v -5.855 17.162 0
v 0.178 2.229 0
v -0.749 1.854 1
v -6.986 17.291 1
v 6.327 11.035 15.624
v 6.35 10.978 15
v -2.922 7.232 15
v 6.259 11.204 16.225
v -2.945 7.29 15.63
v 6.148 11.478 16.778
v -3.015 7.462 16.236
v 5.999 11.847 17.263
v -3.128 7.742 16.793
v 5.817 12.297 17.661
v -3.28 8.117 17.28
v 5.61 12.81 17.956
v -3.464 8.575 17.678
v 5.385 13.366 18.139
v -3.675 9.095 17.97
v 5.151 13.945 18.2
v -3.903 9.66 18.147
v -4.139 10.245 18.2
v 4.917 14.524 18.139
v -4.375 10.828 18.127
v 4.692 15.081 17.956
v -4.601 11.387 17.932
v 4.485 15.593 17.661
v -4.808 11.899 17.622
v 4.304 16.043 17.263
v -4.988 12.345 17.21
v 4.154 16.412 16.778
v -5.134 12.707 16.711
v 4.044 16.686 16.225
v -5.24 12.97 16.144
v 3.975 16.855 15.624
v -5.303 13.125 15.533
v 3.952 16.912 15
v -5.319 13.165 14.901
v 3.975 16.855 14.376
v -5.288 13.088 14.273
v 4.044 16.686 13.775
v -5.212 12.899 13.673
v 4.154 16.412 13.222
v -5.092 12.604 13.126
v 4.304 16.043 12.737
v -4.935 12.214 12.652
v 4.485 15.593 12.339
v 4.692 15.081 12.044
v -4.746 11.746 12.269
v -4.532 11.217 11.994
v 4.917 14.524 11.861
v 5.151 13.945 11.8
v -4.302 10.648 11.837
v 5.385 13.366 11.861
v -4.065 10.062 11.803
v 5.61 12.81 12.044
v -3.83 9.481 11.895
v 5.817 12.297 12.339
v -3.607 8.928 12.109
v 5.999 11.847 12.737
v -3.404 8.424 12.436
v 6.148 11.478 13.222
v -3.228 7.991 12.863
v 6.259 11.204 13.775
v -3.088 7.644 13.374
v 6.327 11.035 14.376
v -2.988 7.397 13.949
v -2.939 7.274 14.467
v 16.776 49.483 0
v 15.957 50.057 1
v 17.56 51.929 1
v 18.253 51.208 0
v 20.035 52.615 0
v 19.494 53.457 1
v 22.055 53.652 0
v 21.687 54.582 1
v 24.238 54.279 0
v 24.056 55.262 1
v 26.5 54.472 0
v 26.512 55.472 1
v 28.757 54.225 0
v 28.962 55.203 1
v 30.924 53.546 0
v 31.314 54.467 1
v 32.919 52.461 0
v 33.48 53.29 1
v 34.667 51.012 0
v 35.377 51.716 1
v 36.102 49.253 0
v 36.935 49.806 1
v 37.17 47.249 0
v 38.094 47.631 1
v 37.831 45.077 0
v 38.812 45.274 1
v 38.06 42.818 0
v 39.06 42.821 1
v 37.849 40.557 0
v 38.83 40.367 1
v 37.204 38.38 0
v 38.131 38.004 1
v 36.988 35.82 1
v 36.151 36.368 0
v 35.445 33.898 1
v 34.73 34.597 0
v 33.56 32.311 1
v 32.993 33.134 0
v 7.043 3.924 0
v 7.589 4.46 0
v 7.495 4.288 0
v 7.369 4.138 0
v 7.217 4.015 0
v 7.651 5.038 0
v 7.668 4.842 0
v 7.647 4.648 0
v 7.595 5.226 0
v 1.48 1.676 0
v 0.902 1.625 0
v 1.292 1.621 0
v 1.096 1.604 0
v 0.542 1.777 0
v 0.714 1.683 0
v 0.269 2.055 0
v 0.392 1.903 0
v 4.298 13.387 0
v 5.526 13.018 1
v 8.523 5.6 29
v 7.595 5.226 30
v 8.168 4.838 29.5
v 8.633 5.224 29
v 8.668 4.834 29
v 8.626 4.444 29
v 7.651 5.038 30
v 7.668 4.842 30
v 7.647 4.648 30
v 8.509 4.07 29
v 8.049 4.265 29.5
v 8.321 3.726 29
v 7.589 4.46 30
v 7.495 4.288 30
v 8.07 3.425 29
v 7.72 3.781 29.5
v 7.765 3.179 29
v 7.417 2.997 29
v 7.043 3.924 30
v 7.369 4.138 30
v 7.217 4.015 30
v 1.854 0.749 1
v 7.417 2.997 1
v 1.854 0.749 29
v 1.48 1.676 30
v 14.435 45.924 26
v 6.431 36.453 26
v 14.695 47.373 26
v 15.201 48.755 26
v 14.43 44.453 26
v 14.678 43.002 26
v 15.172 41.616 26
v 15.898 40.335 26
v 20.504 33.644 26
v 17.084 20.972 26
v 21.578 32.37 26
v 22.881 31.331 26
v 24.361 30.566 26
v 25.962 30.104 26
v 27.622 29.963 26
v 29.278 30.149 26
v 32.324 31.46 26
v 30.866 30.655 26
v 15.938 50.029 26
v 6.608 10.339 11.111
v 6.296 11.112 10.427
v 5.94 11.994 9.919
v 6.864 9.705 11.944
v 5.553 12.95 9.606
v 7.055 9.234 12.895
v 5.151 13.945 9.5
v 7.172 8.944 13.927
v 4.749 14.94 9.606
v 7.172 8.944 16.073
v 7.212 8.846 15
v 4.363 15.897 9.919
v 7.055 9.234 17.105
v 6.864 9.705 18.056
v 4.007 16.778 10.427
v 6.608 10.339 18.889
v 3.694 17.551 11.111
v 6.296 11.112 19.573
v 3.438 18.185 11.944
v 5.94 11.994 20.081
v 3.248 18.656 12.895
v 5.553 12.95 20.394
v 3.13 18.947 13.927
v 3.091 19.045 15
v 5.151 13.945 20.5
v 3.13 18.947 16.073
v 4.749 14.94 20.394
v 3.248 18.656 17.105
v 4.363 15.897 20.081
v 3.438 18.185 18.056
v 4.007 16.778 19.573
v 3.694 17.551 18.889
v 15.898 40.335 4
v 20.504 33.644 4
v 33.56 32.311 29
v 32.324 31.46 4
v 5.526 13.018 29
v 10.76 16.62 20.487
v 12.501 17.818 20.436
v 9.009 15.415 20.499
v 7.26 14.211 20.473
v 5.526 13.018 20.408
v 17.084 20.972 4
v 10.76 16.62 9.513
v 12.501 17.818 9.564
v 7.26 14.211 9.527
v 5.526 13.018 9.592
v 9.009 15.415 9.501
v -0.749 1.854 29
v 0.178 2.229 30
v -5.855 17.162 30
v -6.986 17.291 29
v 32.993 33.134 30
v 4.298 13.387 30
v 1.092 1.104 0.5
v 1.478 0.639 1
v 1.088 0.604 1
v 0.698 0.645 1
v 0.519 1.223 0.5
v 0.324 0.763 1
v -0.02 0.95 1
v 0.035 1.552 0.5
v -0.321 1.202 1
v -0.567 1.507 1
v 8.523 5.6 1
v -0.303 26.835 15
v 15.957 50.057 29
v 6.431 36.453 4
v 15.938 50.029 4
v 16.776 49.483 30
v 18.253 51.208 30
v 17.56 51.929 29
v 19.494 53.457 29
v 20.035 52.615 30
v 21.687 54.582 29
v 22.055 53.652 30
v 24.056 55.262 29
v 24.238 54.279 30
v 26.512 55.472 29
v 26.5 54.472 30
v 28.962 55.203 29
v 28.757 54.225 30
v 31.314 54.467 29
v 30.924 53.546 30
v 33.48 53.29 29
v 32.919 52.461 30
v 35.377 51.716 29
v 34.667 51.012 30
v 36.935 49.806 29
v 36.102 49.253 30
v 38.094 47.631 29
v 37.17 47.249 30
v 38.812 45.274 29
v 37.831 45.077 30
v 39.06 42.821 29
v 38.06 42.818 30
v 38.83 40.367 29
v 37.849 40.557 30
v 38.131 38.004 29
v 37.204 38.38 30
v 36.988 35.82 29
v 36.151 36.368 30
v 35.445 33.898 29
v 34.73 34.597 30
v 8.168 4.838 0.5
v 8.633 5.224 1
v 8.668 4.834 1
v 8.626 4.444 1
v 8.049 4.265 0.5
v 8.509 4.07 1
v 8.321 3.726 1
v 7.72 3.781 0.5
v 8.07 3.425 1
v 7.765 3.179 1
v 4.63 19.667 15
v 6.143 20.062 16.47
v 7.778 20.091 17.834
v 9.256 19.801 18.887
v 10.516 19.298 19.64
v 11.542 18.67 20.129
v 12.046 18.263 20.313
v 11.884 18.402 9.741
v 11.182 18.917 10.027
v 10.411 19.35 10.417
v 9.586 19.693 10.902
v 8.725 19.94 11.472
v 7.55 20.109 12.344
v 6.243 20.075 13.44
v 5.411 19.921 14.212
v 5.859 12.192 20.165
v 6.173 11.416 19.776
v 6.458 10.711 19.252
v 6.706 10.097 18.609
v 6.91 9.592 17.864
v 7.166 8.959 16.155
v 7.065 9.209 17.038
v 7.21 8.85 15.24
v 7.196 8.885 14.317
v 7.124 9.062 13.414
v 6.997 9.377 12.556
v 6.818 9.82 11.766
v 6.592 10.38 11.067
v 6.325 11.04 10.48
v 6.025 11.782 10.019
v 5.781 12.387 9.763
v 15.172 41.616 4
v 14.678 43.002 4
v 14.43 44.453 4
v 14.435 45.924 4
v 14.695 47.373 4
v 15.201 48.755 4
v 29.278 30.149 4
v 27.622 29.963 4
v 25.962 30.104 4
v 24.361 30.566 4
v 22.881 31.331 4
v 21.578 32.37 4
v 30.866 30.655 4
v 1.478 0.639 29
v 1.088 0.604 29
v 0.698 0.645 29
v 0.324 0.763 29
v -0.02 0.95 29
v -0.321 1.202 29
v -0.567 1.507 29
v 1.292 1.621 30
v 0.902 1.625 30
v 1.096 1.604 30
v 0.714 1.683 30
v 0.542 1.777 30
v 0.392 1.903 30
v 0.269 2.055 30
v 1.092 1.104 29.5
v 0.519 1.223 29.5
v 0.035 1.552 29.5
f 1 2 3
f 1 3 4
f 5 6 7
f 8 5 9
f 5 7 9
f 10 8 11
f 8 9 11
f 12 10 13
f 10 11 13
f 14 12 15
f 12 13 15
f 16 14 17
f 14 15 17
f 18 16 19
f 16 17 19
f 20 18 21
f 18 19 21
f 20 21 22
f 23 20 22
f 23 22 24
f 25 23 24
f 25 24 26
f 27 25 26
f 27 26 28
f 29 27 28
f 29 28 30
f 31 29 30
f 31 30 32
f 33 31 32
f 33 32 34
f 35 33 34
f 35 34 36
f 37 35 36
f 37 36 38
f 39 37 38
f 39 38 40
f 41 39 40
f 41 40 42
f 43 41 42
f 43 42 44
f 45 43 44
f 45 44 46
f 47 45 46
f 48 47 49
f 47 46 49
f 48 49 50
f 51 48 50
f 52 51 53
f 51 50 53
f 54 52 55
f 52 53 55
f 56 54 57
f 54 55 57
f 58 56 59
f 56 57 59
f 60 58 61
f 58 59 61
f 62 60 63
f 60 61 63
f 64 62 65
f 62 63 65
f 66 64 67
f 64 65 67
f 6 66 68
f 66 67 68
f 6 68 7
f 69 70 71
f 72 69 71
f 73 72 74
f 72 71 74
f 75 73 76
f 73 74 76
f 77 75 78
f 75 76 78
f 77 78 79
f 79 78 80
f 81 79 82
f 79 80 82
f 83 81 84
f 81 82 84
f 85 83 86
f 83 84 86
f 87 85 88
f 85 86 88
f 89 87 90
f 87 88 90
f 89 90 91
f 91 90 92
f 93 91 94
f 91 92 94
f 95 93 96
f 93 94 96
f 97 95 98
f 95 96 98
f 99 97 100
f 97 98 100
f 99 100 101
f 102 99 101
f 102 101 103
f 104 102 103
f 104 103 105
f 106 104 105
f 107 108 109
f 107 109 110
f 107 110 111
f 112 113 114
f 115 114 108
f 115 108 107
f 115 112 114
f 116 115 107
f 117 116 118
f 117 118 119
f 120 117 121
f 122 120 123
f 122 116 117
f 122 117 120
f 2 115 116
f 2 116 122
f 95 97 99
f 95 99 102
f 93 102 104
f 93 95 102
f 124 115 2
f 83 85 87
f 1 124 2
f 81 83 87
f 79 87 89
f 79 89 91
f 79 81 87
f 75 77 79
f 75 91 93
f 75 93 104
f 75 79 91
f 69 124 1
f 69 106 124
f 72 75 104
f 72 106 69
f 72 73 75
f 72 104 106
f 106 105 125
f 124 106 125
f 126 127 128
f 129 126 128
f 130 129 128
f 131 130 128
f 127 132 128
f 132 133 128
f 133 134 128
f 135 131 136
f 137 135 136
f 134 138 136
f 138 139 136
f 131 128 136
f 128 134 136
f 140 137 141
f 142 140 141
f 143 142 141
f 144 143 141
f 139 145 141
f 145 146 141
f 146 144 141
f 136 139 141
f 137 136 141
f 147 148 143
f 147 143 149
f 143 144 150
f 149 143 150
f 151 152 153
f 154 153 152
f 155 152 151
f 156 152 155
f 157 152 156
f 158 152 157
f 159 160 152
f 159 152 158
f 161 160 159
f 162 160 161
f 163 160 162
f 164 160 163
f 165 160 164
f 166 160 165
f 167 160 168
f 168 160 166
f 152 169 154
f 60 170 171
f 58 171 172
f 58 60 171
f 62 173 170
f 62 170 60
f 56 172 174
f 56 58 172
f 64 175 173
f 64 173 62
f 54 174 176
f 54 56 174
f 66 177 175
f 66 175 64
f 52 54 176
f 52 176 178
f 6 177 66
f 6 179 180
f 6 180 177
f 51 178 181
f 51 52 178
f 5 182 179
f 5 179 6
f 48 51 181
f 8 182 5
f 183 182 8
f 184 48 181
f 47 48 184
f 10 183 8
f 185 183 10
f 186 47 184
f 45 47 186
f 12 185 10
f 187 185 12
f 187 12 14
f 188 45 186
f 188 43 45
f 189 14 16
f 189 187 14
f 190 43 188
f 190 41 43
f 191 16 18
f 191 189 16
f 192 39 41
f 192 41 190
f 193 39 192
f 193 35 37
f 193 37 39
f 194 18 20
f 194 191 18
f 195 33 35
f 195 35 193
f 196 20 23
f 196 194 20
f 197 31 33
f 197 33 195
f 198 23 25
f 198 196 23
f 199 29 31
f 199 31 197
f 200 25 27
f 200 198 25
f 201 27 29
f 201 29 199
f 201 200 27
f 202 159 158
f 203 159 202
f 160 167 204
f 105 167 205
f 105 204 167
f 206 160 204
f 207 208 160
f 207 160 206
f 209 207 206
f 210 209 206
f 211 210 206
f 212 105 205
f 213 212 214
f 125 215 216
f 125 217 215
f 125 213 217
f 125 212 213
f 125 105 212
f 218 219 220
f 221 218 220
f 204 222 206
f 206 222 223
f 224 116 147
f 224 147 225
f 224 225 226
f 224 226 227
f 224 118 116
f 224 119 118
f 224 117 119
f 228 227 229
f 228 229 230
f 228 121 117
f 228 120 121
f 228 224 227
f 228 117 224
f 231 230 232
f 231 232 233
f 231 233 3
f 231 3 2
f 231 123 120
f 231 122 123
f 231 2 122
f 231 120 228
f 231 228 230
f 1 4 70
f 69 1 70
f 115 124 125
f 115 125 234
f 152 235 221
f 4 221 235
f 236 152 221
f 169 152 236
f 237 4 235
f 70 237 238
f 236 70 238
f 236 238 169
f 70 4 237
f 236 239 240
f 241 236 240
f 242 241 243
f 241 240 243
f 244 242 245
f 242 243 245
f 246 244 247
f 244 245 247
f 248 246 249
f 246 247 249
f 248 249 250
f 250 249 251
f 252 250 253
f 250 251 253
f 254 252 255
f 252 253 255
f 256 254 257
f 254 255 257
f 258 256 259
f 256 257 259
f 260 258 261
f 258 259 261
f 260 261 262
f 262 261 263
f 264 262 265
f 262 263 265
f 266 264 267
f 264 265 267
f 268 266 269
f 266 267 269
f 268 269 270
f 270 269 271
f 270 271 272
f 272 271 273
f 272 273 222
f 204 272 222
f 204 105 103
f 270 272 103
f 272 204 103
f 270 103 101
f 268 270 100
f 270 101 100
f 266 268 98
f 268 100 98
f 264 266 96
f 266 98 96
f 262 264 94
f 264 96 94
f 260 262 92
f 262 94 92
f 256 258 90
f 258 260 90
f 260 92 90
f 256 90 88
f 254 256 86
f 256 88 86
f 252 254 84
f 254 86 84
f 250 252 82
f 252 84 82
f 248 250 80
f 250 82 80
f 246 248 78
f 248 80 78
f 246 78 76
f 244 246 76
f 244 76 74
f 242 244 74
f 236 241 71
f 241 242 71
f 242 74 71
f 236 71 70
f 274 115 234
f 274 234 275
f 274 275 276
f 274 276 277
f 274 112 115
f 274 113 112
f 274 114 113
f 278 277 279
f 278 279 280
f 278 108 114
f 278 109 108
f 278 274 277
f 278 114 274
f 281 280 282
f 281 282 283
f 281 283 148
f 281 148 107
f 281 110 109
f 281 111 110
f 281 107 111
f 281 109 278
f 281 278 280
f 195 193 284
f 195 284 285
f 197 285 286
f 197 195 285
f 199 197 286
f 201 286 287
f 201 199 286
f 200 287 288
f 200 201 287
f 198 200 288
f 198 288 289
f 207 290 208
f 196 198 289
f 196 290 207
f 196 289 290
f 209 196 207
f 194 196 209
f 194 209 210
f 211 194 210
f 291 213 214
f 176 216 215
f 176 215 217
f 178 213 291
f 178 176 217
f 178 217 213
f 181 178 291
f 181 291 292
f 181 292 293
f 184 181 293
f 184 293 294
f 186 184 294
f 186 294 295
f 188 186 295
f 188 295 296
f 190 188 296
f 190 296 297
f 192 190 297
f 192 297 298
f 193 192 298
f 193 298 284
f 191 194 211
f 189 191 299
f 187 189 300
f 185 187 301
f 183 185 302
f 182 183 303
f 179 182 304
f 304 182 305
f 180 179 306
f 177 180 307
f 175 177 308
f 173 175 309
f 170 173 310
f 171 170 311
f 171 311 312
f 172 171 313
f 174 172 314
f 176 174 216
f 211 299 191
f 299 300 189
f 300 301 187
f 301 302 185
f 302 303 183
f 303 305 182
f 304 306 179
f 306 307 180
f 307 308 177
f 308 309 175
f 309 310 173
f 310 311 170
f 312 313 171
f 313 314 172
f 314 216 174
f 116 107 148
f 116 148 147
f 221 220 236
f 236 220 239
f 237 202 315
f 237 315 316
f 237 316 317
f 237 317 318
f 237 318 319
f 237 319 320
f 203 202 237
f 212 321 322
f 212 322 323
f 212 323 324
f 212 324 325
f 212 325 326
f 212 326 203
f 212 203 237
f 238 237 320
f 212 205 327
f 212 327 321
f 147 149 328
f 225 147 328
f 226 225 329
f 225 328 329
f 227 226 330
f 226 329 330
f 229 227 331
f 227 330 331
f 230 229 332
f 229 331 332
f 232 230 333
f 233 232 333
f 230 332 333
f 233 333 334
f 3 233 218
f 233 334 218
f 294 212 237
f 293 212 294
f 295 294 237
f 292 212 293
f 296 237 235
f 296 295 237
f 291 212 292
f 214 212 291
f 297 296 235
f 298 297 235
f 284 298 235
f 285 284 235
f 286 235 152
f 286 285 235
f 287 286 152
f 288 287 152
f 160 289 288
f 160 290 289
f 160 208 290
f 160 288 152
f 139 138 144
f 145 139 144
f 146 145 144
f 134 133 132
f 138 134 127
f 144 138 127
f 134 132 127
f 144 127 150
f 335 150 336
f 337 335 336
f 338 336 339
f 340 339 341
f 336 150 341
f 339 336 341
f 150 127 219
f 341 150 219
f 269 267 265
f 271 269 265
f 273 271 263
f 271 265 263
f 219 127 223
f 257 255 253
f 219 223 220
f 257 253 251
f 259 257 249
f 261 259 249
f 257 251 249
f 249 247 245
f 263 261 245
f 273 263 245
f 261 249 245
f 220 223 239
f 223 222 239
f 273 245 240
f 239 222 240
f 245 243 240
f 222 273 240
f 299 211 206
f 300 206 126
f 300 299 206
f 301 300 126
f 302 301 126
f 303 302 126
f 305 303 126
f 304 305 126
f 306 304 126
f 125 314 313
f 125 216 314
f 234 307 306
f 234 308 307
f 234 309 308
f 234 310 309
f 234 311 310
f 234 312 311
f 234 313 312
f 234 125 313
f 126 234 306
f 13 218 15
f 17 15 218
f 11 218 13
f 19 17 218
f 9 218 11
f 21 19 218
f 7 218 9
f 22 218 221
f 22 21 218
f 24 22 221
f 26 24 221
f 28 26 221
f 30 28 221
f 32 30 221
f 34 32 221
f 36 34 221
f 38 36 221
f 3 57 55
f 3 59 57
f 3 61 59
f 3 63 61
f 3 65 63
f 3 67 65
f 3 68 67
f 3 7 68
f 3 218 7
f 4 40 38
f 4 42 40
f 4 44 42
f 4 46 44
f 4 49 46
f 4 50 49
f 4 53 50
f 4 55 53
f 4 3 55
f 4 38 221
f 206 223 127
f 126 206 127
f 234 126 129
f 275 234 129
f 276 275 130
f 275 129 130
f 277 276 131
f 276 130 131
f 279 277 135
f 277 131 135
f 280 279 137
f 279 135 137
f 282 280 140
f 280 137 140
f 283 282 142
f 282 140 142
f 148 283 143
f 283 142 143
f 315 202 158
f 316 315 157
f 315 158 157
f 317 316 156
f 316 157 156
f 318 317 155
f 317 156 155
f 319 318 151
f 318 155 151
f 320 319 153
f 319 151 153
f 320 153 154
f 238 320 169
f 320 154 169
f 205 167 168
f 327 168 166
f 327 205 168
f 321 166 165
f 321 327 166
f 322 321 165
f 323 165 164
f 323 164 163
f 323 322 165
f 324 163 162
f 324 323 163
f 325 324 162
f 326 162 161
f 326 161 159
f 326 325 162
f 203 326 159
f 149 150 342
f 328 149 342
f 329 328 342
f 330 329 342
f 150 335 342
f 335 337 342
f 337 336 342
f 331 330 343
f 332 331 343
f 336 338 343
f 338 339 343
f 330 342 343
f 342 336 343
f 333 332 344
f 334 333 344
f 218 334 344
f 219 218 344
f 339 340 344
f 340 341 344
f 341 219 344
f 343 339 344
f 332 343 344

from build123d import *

# Parameters (mm, degrees)
PAD_DEPTH       = 30
POCKET_DEPTH    = 42.067391
FILLET_R        = 8.5
SKETCH002_R     = 3.2
POCKET001_DEPTH = 56.997477
SKETCH003_R     = 5.5
POCKET002_DEPTH = 46.997477
FILLET001_R     = 2
CHAMFER_SIZE    = 1


with BuildPart() as part:
    # Sketch → Pad (new body)
    with BuildSketch(Plane.XY):
        with BuildLine():
            Line((33.560053, 32.310668), (5.525773, 13.017904))
            Line((5.525773, 13.017904), (9.271839, 3.746066))
            Line((9.271839, 3.746066), (0, 0))
            Line((0, 0), (-6.986015, 17.290994))
            Line((-6.986015, 17.290994), (15.957042, 50.057076))
            ThreePointArc((33.560053, 32.310668), (35.376884, 51.716409), (15.957042, 50.057076))
        make_face()
    extrude(amount=PAD_DEPTH)

    # Sketch001 (on Face1 of Pad) → Pocket (cut, through all)
    with BuildSketch(Plane(origin=(-4.303566, 6.253504, 0), x_dir=(0.823779, 0.566912, 0), z_dir=(0.566912, -0.823779, 0))):
        Polygon((25.963349, 4), (14.963349, 15), (25.963349, 26), (35.963349, 26), (35.963349, 4), align=None)
    extrude(amount=-POCKET_DEPTH, mode=Mode.SUBTRACT)

    # Fillet
    fillet_edges = [part.edges().sort_by_distance(p)[0] for p in [
        (12.55333, 45.196071, 15),
        (25.322268, 26.64155, 15),
    ]]
    fillet(fillet_edges, radius=FILLET_R)

    # Sketch002 (on Face15 of Fillet) → Pocket001 (cut, through all)
    with BuildSketch(Plane(origin=(0, 0, 0), x_dir=(0.374607, -0.927184, 0), z_dir=(-0.927184, -0.374607, 0))):
        with Locations((-11, 15)):
            Circle(SKETCH002_R)
    extrude(amount=-POCKET001_DEPTH, mode=Mode.SUBTRACT)

    # Sketch003 (on Face5 of Pocket001) → Pocket002 (cut, through all)
    with BuildSketch(Plane(origin=(9.271839, 3.746066, 0), x_dir=(-0.374607, 0.927184, 0), z_dir=(0.927184, 0.374607, 0))):
        with Locations((11, 15)):
            Circle(SKETCH003_R)
    extrude(amount=POCKET002_DEPTH, mode=Mode.SUBTRACT)

    # Fillet001
    fillet001_edges = [part.edges().sort_by_distance(p)[0] for p in [
        (9.271839, 3.746066, 15),
        (0, 0, 15),
    ]]
    fillet(fillet001_edges, radius=FILLET001_R)

    # Chamfer
    chamfer_edges = [part.edges().sort_by_distance(p)[0] for p in [
        (7.024199, 9.309169, 0),
        (8.509267, 4.069758, 0),
        (19.542913, 22.664286, 0),
        (4.635919, 1.873033, 0),
        (35.376884, 51.716409, 0),
        (0.323692, 0.762571, 0),
        (4.485514, 33.674035, 0),
        (-3.867614, 9.572681, 0),
        (7.024199, 9.309169, 30),
        (8.509267, 4.069758, 30),
        (19.542913, 22.664286, 30),
        (4.635919, 1.873033, 30),
        (35.376884, 51.716409, 30),
        (0.323692, 0.762571, 30),
        (4.485514, 33.674035, 30),
        (-3.867614, 9.572681, 30),
    ]]
    chamfer(chamfer_edges, length=CHAMFER_SIZE)


solid = part.part
